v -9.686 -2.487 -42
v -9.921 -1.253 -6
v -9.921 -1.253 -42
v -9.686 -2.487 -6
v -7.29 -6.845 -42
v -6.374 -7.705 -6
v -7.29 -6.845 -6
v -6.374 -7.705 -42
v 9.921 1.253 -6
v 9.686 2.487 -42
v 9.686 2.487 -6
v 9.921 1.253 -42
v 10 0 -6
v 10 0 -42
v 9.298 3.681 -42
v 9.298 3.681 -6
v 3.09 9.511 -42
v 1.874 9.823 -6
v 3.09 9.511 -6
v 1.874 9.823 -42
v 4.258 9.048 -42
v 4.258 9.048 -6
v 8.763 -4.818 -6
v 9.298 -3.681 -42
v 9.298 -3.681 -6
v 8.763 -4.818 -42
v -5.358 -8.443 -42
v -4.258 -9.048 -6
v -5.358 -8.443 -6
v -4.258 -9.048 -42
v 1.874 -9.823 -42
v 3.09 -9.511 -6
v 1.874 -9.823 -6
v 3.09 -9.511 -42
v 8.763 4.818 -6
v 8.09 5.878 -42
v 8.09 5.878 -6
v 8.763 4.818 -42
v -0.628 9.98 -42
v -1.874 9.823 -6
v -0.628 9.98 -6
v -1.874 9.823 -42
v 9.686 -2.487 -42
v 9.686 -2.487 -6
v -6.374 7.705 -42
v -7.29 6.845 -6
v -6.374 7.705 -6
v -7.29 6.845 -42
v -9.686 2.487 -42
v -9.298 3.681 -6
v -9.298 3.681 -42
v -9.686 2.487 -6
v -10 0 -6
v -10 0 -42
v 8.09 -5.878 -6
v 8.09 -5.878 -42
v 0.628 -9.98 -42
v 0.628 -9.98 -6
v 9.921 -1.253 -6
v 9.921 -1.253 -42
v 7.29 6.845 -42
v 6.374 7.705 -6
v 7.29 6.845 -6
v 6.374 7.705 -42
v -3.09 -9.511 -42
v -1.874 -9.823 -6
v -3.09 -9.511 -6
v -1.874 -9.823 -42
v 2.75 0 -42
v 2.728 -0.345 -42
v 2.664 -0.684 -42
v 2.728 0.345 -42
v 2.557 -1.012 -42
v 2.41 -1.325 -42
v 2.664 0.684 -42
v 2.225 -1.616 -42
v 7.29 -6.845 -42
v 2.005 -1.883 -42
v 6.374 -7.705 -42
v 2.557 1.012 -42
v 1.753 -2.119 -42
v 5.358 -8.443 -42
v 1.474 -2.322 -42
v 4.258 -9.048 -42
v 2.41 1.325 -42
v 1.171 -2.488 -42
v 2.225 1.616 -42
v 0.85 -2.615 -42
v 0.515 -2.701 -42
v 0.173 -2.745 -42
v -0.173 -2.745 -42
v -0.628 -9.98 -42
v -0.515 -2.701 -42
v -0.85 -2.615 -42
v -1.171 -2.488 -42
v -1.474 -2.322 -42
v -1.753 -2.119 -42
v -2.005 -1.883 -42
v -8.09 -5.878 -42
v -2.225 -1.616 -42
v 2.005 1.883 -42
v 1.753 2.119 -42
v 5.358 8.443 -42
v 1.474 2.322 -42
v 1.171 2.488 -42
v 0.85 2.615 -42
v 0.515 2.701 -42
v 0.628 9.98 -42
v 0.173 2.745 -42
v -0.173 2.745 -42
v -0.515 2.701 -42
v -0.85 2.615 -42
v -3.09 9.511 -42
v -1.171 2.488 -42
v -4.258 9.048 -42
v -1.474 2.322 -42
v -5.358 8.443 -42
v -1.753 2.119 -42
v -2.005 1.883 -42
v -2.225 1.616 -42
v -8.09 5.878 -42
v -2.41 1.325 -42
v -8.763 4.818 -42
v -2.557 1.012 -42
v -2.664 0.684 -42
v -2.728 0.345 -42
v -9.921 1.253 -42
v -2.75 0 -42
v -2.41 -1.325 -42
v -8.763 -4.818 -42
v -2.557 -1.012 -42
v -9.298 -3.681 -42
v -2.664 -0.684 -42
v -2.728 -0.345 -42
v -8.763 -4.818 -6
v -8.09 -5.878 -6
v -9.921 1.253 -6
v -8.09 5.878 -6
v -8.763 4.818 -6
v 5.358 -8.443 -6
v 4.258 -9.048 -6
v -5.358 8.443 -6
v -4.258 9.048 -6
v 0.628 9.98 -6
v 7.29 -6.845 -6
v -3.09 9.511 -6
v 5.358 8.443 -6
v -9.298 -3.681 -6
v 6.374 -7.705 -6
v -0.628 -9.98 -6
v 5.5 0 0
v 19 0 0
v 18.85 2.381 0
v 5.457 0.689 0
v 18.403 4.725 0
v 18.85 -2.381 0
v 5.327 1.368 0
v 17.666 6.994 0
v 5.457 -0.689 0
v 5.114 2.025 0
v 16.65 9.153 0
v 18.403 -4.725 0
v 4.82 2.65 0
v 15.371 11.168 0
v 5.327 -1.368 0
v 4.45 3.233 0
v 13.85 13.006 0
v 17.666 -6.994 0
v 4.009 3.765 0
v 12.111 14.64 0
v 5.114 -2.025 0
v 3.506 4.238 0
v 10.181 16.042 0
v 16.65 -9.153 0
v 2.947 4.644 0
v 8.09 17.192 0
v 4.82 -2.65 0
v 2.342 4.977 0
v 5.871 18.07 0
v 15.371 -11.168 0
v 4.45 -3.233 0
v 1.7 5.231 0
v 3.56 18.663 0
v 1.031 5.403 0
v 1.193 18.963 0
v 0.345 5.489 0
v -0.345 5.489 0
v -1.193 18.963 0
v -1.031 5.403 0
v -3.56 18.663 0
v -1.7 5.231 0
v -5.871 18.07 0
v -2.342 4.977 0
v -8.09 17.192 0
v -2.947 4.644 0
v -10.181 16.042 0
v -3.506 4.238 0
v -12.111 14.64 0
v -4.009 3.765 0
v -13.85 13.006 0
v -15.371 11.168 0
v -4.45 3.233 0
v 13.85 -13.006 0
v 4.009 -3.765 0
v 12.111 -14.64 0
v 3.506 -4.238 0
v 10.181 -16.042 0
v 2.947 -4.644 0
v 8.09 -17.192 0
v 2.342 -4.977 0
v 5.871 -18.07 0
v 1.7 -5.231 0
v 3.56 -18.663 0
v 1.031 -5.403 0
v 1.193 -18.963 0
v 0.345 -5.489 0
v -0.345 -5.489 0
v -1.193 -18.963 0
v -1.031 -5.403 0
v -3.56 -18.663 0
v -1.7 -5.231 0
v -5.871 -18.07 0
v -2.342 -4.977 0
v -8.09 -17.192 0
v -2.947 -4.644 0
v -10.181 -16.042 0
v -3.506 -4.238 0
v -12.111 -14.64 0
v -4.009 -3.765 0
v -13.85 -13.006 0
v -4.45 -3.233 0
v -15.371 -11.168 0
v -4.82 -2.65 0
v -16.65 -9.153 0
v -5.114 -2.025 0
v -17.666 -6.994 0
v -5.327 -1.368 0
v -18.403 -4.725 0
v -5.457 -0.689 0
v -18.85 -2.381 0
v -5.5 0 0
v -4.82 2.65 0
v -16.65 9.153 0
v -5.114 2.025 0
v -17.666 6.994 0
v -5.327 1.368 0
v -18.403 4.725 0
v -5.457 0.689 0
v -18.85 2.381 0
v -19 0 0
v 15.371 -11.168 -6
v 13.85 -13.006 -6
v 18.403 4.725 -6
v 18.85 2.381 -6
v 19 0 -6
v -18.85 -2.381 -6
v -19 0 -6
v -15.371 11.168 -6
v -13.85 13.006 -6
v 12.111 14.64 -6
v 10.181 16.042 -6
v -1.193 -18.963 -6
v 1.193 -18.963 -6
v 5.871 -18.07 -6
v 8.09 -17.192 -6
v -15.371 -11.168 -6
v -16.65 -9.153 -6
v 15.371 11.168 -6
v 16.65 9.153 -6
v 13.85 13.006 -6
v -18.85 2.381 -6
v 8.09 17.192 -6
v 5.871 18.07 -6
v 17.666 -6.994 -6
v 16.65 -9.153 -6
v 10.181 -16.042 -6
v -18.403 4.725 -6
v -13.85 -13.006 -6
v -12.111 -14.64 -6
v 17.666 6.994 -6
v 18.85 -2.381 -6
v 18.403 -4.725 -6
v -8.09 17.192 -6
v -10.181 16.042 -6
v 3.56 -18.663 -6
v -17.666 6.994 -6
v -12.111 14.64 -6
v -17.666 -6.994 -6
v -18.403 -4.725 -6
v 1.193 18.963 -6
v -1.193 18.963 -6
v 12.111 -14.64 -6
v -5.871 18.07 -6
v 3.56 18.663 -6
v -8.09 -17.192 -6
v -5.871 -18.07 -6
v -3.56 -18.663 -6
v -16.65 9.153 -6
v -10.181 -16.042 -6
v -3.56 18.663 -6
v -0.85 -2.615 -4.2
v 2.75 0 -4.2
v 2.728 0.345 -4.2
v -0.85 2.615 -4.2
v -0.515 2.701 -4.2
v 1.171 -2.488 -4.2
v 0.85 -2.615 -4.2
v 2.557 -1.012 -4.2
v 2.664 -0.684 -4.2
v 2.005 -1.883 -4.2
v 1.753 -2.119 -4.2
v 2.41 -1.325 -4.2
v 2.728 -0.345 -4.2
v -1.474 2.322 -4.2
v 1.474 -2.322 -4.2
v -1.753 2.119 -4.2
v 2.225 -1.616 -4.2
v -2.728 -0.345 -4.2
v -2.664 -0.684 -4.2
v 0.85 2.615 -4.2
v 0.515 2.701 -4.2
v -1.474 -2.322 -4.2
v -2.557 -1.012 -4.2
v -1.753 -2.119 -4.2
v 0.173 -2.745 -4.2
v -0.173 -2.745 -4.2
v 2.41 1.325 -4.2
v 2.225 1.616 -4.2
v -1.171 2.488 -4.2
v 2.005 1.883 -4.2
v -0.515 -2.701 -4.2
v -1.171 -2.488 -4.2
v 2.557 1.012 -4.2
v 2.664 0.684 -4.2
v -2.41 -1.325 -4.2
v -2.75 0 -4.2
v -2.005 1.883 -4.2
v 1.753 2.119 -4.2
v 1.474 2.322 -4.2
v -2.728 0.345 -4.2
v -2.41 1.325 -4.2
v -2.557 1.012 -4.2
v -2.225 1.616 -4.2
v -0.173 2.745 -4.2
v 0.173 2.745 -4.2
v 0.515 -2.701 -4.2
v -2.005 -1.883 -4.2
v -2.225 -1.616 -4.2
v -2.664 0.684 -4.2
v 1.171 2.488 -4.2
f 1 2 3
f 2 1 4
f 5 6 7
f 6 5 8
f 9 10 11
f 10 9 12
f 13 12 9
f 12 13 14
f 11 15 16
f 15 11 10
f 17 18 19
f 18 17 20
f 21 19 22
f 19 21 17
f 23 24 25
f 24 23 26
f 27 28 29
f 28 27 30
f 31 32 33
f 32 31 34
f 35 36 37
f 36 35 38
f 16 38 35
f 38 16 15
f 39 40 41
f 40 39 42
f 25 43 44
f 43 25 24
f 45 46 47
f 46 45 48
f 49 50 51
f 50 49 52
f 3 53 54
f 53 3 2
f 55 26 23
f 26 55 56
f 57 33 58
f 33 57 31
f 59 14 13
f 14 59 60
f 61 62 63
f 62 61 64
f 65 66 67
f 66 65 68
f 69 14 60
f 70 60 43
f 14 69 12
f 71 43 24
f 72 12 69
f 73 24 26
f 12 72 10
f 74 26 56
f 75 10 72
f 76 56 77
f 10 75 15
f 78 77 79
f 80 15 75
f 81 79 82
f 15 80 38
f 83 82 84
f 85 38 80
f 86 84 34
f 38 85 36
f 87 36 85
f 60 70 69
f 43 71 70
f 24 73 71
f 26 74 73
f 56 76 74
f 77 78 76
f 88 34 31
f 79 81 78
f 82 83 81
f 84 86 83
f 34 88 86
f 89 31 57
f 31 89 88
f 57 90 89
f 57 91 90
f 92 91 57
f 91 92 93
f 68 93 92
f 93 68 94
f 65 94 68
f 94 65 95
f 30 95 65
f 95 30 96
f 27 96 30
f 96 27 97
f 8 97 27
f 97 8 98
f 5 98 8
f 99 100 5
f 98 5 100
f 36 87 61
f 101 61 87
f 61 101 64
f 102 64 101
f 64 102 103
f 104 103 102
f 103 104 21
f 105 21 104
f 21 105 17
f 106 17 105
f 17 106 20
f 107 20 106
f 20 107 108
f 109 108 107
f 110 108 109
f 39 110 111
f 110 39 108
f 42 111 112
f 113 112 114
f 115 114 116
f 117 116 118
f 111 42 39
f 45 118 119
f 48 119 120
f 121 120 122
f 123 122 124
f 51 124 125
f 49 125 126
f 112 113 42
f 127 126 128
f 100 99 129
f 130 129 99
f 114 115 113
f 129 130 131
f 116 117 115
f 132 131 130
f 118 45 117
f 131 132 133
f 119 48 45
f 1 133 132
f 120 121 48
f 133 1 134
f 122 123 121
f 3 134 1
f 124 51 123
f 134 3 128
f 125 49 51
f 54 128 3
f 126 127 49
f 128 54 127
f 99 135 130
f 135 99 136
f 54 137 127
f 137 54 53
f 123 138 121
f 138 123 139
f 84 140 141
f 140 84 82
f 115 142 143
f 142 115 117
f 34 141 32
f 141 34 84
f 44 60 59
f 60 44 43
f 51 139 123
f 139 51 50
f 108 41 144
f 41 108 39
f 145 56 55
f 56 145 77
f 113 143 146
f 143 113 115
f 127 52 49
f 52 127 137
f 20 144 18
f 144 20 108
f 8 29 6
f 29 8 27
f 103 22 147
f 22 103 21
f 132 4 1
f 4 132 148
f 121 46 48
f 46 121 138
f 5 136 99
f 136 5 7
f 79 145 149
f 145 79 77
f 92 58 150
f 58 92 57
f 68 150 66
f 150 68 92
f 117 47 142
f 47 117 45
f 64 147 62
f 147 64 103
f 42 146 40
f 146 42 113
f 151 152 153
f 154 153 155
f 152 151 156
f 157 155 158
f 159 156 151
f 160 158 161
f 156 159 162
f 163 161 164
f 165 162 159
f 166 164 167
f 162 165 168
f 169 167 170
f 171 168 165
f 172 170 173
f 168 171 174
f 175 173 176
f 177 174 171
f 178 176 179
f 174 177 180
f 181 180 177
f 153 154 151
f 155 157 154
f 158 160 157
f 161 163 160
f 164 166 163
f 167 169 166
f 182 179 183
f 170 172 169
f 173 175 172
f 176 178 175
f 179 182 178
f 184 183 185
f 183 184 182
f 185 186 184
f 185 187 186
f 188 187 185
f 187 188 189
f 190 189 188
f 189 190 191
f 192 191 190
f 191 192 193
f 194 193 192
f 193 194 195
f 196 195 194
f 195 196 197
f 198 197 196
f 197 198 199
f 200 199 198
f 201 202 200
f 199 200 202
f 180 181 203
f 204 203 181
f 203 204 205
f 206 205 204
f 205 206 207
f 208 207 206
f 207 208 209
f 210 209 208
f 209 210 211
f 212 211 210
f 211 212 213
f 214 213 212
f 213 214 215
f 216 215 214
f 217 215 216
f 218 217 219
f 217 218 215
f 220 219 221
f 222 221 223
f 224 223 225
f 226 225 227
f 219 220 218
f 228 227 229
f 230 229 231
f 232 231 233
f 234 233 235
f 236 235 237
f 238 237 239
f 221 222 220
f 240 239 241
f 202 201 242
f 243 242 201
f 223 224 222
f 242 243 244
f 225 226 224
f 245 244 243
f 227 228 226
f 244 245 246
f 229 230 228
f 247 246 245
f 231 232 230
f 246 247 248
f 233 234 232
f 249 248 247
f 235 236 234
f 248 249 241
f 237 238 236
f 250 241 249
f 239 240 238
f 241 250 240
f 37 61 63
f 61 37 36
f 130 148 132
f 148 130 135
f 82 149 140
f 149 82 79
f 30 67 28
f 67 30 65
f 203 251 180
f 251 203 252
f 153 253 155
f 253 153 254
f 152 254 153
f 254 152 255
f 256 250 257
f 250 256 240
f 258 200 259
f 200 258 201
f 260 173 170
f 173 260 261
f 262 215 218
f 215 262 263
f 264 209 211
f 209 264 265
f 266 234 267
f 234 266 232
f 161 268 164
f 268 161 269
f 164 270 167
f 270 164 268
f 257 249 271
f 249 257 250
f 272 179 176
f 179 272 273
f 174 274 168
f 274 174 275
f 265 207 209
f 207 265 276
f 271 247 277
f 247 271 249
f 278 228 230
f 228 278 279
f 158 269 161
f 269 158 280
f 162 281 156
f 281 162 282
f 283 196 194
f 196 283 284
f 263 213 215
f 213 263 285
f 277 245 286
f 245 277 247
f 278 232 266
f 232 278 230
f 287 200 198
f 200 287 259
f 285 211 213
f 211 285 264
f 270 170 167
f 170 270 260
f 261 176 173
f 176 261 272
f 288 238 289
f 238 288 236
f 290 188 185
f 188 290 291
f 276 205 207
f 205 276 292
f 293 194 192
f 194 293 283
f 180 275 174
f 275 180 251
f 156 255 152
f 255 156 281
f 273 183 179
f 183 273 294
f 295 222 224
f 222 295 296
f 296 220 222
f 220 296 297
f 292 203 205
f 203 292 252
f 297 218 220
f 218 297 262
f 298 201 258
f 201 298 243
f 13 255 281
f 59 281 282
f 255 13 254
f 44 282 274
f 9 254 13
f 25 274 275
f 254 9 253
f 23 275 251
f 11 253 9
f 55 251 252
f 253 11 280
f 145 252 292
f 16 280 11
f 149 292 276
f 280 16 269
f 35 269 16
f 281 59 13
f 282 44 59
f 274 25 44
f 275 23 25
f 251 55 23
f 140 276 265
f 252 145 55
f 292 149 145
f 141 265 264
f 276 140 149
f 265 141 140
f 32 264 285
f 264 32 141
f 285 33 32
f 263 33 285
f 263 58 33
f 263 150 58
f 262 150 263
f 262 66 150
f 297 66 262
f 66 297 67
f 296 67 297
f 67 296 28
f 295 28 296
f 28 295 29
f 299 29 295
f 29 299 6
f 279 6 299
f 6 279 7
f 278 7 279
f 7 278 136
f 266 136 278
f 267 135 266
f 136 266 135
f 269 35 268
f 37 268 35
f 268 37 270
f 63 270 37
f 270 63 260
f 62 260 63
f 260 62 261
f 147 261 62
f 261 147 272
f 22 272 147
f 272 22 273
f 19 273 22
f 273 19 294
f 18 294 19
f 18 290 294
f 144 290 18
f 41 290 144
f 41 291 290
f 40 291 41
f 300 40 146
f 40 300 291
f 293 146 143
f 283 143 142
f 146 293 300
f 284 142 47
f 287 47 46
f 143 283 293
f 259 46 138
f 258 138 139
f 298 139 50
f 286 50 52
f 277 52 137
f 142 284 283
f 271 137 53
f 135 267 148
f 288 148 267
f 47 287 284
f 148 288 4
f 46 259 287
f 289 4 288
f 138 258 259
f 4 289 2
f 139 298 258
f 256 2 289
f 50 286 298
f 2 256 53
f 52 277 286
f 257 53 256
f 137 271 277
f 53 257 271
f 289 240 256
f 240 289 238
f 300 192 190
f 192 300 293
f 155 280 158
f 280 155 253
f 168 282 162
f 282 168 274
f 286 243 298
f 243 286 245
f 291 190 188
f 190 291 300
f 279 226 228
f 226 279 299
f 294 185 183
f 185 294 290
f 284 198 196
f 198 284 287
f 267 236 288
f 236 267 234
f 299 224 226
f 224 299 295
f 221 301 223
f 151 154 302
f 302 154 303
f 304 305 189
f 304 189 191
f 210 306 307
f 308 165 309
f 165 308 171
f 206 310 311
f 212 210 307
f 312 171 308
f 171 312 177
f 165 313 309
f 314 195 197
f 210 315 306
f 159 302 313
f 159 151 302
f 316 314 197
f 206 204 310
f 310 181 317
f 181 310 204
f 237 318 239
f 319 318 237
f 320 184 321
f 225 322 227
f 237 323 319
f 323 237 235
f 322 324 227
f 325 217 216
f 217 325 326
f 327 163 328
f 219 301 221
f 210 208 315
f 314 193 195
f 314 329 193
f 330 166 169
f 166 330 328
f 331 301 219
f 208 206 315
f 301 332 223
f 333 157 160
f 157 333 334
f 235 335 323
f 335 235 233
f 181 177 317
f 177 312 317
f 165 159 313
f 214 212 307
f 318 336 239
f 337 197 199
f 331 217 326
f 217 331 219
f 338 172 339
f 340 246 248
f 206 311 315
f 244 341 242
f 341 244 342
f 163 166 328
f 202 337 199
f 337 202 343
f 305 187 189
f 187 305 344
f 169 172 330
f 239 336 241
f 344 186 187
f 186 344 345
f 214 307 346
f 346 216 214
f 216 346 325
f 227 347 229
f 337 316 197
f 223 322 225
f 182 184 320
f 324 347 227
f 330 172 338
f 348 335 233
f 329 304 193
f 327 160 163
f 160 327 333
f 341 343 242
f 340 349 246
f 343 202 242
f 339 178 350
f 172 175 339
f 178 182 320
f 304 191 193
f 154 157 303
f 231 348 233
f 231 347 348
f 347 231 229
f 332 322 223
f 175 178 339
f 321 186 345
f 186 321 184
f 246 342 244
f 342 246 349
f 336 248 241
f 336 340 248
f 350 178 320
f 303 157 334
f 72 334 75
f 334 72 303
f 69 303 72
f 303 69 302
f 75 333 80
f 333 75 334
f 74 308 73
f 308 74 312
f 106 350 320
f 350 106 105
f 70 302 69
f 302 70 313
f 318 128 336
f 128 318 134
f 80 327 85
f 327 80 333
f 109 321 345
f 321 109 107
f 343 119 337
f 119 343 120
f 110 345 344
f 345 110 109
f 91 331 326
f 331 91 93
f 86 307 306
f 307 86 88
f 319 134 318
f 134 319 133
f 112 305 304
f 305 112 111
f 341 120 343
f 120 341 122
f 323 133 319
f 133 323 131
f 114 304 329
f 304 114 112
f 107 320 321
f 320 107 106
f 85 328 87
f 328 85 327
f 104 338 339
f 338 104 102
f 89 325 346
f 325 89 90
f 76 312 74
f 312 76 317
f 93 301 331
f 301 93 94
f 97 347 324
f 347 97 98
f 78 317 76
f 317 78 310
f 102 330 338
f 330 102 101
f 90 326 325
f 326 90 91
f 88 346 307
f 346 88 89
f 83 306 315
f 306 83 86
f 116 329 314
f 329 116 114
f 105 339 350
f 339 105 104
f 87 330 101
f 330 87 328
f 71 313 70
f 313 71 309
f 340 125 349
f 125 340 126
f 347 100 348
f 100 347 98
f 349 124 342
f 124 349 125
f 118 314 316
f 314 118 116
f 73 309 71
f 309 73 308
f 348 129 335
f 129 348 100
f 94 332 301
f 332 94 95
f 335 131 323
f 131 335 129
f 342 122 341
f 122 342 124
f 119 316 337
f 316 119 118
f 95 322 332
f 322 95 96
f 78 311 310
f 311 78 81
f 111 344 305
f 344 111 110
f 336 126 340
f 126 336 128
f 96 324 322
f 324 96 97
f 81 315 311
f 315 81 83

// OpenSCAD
$fn = 50;


difference() {
	union() {
		translate(v = [0, 0, -42.0000000000]) {
			cylinder(h = 42, r = 10.0000000000);
		}
		translate(v = [0, 0, -6.0000000000]) {
			cylinder(h = 6, r = 19.0000000000);
		}
	}
	union() {
		translate(v = [0, 0, 0]) {
			rotate(a = [0, 0, 0]) {
				difference() {
					union() {
						#translate(v = [0, 0, -42.0000000000]) {
							cylinder(h = 42, r = 2.2500000000);
						}
						#translate(v = [0, 0, -4.2000000000]) {
							cylinder(h = 4.2000000000, r = 10.0000000000, r1 = 2.7500000000, r2 = 5.5000000000);
						}
						#translate(v = [0, 0, -42.0000000000]) {
							cylinder(h = 42, r = 2.7500000000);
						}
						#translate(v = [0, 0, -42.0000000000]) {
							cylinder(h = 42, r = 2.2500000000);
						}
					}
					union();
				}
			}
		}
	}
}
